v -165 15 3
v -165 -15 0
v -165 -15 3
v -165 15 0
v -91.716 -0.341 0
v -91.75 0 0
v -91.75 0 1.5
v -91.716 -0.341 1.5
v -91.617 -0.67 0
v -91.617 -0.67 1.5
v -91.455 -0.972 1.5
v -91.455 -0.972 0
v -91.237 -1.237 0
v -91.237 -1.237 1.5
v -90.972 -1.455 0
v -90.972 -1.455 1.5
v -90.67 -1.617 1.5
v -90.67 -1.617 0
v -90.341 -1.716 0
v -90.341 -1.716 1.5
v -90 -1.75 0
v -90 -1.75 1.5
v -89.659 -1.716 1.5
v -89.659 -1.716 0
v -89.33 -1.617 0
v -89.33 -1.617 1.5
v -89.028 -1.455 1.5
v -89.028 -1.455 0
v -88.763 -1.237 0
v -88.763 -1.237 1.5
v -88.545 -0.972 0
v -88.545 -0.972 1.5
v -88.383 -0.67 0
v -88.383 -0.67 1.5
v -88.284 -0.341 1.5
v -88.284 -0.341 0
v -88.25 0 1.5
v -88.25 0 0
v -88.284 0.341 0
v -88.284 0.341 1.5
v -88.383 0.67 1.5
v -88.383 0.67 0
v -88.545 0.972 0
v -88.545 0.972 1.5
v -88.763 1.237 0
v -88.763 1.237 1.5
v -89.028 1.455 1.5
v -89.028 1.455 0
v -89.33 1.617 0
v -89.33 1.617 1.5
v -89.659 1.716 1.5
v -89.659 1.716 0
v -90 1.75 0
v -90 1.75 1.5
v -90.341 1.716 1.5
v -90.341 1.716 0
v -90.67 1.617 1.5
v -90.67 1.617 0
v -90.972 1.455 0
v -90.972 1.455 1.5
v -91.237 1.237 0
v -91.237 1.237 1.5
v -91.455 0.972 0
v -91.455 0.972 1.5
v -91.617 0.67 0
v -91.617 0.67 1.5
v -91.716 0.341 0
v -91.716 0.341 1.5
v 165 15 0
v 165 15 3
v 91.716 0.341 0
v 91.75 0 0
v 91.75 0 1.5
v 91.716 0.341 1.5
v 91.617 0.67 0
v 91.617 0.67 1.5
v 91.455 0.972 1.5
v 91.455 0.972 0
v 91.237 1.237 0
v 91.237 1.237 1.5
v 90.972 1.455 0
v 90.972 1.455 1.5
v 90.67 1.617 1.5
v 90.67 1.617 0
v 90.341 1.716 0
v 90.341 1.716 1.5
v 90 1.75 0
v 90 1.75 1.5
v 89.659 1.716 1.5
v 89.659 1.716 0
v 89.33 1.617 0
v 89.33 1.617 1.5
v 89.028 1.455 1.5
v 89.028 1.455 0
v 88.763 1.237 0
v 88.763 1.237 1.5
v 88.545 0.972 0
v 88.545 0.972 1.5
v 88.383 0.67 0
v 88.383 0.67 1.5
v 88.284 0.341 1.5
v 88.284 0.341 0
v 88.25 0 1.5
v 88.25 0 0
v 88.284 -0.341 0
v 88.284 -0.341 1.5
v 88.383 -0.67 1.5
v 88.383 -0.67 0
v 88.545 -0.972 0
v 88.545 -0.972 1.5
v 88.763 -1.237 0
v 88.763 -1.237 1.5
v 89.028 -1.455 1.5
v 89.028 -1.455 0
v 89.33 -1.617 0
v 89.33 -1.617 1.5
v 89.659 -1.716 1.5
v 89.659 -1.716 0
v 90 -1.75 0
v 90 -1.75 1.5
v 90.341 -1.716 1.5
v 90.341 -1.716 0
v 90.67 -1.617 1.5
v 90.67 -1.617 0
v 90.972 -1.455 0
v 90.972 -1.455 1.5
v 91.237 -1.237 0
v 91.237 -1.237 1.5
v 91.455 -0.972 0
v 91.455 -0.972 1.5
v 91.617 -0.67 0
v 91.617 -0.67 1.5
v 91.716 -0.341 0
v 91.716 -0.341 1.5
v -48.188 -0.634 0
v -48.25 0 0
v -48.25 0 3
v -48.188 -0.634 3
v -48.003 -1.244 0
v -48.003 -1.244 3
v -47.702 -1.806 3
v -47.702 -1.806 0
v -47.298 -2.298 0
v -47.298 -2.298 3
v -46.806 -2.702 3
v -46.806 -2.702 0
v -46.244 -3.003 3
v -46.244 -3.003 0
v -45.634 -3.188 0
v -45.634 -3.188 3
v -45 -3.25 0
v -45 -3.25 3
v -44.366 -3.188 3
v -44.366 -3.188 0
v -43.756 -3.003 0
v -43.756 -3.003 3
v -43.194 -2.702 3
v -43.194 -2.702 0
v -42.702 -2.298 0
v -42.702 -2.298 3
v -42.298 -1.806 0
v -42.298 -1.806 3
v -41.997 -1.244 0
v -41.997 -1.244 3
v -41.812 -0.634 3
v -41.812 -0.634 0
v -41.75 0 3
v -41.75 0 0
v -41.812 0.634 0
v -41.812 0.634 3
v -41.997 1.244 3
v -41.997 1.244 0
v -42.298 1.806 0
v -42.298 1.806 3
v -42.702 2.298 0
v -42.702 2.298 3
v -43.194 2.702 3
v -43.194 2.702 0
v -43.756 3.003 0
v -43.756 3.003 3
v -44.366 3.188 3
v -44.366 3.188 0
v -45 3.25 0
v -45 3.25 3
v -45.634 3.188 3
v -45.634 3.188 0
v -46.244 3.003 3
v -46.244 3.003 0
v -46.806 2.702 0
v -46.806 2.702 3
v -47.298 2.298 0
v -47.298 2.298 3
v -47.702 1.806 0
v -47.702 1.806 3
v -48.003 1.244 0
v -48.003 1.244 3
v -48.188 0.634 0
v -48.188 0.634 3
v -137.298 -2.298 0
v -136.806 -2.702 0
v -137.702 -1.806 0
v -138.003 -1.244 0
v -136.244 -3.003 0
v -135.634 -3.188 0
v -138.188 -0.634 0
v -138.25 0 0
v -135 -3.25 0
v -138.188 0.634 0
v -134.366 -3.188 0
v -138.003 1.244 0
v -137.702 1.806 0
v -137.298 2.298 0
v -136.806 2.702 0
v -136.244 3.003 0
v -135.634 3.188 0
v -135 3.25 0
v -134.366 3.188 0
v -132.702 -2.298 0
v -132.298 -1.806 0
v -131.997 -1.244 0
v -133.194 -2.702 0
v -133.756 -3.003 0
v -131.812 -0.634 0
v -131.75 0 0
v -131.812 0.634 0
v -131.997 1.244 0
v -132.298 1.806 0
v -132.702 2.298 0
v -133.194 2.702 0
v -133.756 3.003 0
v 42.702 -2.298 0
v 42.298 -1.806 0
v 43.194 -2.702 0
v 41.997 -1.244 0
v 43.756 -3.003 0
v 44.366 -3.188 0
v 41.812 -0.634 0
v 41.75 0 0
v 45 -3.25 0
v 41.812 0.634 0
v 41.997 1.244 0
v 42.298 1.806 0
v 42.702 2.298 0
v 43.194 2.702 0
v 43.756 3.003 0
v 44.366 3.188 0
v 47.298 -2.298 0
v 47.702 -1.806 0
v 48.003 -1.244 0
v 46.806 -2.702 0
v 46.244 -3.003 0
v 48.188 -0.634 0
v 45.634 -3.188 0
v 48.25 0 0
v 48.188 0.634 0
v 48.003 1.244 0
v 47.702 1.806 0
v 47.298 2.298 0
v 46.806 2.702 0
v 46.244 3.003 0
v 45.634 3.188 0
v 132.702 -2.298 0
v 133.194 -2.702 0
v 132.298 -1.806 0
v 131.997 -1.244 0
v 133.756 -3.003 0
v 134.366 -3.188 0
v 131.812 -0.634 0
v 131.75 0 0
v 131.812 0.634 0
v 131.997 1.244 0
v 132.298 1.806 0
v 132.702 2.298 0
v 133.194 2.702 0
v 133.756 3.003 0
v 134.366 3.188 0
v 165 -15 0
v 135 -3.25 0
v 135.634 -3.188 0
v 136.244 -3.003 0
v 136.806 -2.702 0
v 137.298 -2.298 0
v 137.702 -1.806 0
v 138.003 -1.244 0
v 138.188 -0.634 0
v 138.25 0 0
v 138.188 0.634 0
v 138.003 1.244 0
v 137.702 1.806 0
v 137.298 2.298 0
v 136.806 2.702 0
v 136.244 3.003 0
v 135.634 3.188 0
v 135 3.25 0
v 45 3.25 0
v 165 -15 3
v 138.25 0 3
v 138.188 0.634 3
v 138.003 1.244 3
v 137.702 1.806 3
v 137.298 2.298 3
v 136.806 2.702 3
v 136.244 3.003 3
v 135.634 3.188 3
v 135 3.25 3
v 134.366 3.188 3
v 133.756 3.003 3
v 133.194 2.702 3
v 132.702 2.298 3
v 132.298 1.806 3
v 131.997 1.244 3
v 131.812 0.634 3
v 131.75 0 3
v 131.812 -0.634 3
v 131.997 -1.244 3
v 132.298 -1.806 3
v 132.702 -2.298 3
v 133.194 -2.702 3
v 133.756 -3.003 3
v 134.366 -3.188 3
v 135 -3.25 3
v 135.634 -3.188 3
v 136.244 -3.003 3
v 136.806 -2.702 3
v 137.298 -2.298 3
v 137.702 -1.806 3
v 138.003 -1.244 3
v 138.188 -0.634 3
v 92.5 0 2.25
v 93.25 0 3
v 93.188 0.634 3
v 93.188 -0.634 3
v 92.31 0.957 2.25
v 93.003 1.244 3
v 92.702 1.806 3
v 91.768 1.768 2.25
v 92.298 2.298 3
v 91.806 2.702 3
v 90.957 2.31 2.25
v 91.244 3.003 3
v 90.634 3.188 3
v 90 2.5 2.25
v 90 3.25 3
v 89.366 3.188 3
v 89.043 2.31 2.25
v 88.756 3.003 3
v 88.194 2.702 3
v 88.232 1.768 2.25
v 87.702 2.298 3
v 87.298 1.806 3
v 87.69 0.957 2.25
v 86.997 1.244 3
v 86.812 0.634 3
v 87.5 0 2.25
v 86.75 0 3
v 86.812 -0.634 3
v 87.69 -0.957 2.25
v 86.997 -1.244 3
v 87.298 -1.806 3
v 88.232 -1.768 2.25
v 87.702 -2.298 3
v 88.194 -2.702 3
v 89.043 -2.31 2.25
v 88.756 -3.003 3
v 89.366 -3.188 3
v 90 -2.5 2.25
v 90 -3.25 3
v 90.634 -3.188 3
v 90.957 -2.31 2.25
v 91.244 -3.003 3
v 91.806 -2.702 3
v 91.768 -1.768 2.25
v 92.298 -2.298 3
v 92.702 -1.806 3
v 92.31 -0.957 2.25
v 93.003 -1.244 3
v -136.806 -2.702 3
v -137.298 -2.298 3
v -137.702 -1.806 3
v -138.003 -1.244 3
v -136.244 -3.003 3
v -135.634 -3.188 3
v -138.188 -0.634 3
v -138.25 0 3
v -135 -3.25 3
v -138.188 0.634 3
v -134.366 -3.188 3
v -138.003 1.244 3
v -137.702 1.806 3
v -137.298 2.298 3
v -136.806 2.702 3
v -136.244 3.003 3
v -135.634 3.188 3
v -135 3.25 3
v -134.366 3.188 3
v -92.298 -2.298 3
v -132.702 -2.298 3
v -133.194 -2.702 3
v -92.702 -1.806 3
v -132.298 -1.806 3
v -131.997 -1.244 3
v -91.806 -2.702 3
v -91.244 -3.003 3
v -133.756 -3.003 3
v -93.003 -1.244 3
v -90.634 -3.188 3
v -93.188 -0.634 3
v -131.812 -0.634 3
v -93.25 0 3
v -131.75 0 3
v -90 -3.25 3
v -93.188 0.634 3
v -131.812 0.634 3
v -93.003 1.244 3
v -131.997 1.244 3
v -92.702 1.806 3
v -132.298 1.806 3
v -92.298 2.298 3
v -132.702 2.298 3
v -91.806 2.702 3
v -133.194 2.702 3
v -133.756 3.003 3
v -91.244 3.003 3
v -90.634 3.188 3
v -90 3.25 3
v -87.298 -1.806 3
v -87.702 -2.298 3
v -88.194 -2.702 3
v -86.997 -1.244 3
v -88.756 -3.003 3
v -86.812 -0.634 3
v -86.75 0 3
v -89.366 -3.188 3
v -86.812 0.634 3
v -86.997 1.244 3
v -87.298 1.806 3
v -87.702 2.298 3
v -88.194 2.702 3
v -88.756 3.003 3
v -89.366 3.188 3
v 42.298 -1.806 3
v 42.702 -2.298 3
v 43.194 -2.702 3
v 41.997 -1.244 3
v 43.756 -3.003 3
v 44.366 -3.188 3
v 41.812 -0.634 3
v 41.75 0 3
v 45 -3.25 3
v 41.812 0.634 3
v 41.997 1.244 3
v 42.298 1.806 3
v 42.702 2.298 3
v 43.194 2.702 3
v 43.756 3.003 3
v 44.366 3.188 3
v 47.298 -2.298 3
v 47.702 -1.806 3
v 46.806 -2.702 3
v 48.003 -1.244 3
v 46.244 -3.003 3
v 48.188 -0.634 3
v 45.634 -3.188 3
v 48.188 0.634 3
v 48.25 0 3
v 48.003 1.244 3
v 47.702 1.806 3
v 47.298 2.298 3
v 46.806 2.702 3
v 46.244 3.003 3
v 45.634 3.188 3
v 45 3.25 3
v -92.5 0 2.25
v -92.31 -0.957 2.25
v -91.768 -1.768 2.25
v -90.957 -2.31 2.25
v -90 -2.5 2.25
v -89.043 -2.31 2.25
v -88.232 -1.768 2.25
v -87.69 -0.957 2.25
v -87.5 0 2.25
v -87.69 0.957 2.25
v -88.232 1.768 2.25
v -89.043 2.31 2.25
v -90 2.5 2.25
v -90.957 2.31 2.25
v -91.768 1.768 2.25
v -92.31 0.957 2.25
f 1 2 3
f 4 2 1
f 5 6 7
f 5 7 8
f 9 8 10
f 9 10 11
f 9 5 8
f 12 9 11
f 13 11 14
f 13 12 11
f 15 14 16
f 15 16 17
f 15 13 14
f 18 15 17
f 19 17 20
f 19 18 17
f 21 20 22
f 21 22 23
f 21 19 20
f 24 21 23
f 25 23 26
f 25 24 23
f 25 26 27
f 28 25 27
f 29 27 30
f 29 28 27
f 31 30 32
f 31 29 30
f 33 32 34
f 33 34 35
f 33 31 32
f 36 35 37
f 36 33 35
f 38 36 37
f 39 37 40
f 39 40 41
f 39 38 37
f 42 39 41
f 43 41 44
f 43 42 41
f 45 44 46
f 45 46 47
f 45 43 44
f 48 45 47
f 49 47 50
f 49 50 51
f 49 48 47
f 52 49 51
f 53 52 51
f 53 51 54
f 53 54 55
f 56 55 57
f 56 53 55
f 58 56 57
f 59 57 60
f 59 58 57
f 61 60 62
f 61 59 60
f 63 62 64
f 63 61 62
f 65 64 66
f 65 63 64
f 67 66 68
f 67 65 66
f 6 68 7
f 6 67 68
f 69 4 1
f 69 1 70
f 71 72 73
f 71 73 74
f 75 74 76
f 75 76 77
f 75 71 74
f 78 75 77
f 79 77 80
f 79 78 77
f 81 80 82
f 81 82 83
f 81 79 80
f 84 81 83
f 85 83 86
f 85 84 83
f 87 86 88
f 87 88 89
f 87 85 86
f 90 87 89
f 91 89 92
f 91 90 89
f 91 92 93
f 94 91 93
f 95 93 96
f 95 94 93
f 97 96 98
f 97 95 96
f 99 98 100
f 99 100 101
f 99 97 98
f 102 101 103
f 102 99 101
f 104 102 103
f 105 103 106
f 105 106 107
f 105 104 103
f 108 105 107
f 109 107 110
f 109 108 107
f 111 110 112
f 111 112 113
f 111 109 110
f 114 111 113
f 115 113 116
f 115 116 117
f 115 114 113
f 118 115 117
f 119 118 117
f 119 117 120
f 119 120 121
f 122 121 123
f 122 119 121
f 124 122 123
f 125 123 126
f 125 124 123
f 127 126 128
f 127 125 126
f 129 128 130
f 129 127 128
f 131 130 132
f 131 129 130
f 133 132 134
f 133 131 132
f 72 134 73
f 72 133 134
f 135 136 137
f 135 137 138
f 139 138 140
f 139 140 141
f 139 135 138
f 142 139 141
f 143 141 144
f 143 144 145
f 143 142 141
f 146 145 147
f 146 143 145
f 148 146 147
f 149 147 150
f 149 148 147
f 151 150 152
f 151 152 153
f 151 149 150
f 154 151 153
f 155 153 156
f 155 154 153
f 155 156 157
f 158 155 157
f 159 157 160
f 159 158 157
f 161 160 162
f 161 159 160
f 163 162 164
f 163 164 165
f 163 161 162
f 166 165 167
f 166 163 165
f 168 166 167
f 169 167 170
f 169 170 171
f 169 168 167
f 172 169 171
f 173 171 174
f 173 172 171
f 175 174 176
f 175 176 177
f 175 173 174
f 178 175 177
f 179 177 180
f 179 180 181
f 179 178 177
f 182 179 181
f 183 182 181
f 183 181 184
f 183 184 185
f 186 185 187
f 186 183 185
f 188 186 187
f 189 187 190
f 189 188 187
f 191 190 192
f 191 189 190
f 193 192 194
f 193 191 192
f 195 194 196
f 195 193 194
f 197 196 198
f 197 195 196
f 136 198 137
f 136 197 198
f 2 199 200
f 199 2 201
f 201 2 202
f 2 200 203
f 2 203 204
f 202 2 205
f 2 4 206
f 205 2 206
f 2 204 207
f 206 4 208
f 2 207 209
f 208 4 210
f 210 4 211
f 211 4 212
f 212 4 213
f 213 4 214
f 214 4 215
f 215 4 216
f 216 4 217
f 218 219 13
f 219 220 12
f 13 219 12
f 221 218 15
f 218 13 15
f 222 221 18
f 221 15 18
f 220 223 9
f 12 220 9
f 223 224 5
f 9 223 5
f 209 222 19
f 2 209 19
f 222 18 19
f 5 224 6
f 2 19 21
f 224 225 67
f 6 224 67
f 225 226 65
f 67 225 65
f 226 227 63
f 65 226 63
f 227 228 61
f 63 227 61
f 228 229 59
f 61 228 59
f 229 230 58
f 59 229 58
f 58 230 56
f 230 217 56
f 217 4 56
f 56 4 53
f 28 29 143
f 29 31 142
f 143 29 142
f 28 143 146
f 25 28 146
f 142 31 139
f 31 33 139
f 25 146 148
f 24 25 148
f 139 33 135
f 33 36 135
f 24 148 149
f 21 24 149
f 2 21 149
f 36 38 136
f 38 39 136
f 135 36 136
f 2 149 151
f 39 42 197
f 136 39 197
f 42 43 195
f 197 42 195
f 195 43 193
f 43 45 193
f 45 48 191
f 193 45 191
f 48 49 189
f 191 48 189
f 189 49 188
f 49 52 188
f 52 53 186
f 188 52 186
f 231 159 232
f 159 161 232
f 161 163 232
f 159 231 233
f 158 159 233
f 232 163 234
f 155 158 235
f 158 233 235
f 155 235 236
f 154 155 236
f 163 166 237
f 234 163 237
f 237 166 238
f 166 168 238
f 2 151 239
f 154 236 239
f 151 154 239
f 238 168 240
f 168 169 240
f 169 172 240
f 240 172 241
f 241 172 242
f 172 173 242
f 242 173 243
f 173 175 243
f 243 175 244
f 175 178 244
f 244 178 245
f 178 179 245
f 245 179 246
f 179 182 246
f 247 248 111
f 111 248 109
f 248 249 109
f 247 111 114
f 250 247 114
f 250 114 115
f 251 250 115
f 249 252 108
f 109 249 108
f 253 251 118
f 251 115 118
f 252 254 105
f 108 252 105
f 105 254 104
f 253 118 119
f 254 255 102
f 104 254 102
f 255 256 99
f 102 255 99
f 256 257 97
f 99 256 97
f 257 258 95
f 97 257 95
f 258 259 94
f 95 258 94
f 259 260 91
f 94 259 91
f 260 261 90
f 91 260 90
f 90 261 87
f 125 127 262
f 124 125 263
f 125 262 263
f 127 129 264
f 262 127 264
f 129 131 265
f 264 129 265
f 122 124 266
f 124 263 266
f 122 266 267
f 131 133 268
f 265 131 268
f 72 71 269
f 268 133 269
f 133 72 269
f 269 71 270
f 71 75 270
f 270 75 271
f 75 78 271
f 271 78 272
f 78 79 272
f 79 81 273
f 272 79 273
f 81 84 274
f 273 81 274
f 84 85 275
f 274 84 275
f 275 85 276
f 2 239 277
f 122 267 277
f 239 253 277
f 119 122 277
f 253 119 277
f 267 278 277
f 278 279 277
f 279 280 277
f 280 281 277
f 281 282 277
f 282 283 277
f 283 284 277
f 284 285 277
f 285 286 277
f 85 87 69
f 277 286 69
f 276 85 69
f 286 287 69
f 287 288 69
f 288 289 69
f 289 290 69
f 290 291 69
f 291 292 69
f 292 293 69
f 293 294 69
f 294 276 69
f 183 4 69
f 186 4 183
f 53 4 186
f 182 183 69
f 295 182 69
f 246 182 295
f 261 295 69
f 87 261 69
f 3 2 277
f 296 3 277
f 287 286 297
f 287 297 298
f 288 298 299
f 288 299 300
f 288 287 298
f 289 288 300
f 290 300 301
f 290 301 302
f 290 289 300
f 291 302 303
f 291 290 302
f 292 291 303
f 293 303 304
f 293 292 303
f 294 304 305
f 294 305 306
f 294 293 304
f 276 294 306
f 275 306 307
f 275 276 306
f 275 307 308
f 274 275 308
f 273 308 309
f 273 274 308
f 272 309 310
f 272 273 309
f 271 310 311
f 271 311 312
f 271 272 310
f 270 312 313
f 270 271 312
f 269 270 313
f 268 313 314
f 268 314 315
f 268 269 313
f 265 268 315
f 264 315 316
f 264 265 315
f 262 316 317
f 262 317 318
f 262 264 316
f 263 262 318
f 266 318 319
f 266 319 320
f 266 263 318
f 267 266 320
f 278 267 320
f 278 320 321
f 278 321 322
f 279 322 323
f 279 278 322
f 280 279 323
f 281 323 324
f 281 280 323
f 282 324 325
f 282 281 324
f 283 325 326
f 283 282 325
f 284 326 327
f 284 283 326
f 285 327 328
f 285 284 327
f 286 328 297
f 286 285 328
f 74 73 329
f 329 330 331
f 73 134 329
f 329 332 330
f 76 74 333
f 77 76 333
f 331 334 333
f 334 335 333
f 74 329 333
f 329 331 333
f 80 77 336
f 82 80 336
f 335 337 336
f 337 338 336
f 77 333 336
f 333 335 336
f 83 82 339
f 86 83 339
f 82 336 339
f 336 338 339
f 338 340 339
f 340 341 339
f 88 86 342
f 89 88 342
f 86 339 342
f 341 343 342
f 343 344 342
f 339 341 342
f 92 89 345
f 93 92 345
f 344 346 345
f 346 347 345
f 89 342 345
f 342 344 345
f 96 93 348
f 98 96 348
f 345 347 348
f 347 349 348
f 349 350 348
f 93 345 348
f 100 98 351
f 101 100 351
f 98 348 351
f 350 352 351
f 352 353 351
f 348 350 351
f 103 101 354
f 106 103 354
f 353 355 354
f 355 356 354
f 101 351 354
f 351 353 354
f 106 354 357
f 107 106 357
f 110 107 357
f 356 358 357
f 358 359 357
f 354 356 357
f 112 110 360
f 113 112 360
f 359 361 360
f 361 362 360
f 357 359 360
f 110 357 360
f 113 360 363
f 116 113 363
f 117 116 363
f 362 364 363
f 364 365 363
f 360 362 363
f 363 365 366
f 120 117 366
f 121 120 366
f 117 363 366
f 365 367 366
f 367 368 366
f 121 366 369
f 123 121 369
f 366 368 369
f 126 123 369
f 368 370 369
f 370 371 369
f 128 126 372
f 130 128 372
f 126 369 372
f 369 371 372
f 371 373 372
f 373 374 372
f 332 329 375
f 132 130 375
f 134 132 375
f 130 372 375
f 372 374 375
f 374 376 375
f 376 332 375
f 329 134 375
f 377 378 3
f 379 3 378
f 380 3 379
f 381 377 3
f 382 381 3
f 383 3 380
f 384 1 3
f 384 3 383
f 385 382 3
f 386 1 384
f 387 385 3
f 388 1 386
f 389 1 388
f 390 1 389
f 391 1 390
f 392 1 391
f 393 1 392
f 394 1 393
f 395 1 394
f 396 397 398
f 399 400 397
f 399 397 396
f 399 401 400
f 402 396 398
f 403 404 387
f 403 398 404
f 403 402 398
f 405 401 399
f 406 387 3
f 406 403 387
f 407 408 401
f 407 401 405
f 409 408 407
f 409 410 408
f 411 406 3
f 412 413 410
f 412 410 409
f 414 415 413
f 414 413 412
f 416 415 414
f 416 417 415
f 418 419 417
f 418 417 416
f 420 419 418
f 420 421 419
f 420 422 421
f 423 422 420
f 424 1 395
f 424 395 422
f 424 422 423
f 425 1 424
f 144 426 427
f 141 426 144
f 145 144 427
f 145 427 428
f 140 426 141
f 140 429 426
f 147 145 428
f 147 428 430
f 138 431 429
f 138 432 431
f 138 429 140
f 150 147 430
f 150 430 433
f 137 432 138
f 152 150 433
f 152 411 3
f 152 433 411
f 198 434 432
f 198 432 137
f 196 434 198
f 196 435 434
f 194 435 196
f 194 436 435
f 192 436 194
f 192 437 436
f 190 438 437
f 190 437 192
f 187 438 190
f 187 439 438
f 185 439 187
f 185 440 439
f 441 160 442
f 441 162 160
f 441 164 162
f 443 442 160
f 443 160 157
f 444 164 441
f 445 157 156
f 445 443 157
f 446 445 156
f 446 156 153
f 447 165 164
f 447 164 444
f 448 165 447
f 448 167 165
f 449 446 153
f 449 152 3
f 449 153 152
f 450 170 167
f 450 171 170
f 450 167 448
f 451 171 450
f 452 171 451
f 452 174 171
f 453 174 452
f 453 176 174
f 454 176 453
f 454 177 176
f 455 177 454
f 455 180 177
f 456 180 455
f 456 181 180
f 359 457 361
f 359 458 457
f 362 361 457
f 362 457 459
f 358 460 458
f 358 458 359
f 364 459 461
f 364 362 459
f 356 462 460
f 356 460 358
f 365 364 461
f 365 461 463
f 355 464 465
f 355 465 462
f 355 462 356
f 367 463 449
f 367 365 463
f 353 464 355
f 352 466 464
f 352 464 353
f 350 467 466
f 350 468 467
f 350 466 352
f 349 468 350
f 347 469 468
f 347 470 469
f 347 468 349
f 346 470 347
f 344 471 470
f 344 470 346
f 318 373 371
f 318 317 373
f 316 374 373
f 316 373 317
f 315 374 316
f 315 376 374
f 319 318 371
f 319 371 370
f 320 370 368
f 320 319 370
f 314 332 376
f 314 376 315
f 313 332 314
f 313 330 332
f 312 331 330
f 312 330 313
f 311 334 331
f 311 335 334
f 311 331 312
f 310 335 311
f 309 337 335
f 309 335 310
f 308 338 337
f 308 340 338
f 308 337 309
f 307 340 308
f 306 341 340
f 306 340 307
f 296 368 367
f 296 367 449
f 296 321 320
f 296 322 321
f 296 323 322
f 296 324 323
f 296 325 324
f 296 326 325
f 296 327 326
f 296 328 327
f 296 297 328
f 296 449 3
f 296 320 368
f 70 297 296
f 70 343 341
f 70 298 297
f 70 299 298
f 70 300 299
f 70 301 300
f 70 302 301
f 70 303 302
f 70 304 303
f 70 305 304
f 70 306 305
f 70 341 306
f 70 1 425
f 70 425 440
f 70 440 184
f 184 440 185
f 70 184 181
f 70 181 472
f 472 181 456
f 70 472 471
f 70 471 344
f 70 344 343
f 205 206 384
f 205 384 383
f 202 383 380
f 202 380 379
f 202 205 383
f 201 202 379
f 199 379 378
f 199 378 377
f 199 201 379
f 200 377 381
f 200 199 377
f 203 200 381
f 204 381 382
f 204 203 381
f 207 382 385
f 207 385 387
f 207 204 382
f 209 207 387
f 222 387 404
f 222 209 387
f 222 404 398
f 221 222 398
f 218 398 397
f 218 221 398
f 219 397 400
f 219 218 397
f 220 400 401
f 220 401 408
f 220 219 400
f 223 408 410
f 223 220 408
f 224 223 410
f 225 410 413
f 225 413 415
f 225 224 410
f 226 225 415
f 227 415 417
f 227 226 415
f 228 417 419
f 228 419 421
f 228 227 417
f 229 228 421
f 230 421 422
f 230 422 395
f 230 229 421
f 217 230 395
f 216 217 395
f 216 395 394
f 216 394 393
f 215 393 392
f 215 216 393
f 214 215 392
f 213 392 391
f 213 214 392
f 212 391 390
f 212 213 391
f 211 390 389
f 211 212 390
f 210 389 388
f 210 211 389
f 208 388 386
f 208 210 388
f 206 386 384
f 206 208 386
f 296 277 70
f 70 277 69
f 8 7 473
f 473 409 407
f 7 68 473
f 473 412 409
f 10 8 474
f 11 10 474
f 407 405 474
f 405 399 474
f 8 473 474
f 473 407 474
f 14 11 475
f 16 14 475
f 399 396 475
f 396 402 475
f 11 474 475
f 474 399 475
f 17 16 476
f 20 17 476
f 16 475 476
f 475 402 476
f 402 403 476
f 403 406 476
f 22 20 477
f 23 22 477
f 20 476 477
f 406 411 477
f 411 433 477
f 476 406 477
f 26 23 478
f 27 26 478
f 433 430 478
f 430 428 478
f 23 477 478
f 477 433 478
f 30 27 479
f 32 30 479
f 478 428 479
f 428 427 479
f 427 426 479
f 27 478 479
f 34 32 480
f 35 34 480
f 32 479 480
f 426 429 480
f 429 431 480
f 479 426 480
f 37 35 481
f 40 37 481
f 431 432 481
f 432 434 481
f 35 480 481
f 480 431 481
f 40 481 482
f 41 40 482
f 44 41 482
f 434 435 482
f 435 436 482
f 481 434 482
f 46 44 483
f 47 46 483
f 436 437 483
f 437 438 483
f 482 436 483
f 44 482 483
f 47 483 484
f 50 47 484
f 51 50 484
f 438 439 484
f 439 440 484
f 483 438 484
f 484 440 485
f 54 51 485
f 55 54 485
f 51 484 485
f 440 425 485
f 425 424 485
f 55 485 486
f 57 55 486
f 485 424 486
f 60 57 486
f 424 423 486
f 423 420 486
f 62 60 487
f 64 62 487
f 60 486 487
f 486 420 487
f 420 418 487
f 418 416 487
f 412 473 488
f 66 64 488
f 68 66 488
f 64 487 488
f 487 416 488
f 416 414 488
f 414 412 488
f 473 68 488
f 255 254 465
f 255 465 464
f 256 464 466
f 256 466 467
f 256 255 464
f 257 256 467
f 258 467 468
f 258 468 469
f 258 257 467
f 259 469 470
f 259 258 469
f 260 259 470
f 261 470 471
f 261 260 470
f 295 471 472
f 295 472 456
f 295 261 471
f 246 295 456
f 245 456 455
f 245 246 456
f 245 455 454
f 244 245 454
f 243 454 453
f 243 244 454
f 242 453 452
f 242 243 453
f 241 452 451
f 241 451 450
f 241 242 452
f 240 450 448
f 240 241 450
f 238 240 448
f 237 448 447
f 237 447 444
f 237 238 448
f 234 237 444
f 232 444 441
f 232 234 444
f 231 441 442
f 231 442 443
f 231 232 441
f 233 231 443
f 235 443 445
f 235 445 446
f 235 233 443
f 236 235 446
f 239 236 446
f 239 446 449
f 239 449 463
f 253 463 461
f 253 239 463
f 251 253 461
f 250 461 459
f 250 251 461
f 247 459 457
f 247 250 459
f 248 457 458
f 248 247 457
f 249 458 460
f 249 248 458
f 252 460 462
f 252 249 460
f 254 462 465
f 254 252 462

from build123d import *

# Parameters (mm, degrees)
SKETCH_1_W      = 330
SKETCH_1_H      = 30
SKETCH_1_R      = 3.25
SKETCH_1_R_2    = 1.75
EXTRUDE_1_DEPTH = 3
CHAMFER_1_SIZE  = 1.5


with BuildPart() as part:
    # Эскиз1 → Вытянуть1 (new body)
    with BuildSketch(Plane.XY):
        Rectangle(SKETCH_1_W, SKETCH_1_H)
        with Locations((135, 0)):
            Circle(SKETCH_1_R, mode=Mode.SUBTRACT)
        with Locations((90, 0)):
            Circle(SKETCH_1_R_2, mode=Mode.SUBTRACT)
        with Locations((45, 0)):
            Circle(SKETCH_1_R, mode=Mode.SUBTRACT)
        with Locations(Location((-45, 0, 0), (0, 0, 180))):
            Circle(SKETCH_1_R, mode=Mode.SUBTRACT)
        with Locations(Location((-90, 0, 0), (0, 0, 180))):
            Circle(SKETCH_1_R_2, mode=Mode.SUBTRACT)
        with Locations(Location((-135, 0, 0), (0, 0, 180))):
            Circle(SKETCH_1_R, mode=Mode.SUBTRACT)
    extrude(amount=EXTRUDE_1_DEPTH)

    # Фаска1
    chamfer_1_edges = [part.edges().sort_by_distance(p)[0] for p in [
        (88.25, 0, 3),
        (-88.25, 0, 3),
    ]]
    chamfer(chamfer_1_edges, length=CHAMFER_1_SIZE)


solid = part.part
